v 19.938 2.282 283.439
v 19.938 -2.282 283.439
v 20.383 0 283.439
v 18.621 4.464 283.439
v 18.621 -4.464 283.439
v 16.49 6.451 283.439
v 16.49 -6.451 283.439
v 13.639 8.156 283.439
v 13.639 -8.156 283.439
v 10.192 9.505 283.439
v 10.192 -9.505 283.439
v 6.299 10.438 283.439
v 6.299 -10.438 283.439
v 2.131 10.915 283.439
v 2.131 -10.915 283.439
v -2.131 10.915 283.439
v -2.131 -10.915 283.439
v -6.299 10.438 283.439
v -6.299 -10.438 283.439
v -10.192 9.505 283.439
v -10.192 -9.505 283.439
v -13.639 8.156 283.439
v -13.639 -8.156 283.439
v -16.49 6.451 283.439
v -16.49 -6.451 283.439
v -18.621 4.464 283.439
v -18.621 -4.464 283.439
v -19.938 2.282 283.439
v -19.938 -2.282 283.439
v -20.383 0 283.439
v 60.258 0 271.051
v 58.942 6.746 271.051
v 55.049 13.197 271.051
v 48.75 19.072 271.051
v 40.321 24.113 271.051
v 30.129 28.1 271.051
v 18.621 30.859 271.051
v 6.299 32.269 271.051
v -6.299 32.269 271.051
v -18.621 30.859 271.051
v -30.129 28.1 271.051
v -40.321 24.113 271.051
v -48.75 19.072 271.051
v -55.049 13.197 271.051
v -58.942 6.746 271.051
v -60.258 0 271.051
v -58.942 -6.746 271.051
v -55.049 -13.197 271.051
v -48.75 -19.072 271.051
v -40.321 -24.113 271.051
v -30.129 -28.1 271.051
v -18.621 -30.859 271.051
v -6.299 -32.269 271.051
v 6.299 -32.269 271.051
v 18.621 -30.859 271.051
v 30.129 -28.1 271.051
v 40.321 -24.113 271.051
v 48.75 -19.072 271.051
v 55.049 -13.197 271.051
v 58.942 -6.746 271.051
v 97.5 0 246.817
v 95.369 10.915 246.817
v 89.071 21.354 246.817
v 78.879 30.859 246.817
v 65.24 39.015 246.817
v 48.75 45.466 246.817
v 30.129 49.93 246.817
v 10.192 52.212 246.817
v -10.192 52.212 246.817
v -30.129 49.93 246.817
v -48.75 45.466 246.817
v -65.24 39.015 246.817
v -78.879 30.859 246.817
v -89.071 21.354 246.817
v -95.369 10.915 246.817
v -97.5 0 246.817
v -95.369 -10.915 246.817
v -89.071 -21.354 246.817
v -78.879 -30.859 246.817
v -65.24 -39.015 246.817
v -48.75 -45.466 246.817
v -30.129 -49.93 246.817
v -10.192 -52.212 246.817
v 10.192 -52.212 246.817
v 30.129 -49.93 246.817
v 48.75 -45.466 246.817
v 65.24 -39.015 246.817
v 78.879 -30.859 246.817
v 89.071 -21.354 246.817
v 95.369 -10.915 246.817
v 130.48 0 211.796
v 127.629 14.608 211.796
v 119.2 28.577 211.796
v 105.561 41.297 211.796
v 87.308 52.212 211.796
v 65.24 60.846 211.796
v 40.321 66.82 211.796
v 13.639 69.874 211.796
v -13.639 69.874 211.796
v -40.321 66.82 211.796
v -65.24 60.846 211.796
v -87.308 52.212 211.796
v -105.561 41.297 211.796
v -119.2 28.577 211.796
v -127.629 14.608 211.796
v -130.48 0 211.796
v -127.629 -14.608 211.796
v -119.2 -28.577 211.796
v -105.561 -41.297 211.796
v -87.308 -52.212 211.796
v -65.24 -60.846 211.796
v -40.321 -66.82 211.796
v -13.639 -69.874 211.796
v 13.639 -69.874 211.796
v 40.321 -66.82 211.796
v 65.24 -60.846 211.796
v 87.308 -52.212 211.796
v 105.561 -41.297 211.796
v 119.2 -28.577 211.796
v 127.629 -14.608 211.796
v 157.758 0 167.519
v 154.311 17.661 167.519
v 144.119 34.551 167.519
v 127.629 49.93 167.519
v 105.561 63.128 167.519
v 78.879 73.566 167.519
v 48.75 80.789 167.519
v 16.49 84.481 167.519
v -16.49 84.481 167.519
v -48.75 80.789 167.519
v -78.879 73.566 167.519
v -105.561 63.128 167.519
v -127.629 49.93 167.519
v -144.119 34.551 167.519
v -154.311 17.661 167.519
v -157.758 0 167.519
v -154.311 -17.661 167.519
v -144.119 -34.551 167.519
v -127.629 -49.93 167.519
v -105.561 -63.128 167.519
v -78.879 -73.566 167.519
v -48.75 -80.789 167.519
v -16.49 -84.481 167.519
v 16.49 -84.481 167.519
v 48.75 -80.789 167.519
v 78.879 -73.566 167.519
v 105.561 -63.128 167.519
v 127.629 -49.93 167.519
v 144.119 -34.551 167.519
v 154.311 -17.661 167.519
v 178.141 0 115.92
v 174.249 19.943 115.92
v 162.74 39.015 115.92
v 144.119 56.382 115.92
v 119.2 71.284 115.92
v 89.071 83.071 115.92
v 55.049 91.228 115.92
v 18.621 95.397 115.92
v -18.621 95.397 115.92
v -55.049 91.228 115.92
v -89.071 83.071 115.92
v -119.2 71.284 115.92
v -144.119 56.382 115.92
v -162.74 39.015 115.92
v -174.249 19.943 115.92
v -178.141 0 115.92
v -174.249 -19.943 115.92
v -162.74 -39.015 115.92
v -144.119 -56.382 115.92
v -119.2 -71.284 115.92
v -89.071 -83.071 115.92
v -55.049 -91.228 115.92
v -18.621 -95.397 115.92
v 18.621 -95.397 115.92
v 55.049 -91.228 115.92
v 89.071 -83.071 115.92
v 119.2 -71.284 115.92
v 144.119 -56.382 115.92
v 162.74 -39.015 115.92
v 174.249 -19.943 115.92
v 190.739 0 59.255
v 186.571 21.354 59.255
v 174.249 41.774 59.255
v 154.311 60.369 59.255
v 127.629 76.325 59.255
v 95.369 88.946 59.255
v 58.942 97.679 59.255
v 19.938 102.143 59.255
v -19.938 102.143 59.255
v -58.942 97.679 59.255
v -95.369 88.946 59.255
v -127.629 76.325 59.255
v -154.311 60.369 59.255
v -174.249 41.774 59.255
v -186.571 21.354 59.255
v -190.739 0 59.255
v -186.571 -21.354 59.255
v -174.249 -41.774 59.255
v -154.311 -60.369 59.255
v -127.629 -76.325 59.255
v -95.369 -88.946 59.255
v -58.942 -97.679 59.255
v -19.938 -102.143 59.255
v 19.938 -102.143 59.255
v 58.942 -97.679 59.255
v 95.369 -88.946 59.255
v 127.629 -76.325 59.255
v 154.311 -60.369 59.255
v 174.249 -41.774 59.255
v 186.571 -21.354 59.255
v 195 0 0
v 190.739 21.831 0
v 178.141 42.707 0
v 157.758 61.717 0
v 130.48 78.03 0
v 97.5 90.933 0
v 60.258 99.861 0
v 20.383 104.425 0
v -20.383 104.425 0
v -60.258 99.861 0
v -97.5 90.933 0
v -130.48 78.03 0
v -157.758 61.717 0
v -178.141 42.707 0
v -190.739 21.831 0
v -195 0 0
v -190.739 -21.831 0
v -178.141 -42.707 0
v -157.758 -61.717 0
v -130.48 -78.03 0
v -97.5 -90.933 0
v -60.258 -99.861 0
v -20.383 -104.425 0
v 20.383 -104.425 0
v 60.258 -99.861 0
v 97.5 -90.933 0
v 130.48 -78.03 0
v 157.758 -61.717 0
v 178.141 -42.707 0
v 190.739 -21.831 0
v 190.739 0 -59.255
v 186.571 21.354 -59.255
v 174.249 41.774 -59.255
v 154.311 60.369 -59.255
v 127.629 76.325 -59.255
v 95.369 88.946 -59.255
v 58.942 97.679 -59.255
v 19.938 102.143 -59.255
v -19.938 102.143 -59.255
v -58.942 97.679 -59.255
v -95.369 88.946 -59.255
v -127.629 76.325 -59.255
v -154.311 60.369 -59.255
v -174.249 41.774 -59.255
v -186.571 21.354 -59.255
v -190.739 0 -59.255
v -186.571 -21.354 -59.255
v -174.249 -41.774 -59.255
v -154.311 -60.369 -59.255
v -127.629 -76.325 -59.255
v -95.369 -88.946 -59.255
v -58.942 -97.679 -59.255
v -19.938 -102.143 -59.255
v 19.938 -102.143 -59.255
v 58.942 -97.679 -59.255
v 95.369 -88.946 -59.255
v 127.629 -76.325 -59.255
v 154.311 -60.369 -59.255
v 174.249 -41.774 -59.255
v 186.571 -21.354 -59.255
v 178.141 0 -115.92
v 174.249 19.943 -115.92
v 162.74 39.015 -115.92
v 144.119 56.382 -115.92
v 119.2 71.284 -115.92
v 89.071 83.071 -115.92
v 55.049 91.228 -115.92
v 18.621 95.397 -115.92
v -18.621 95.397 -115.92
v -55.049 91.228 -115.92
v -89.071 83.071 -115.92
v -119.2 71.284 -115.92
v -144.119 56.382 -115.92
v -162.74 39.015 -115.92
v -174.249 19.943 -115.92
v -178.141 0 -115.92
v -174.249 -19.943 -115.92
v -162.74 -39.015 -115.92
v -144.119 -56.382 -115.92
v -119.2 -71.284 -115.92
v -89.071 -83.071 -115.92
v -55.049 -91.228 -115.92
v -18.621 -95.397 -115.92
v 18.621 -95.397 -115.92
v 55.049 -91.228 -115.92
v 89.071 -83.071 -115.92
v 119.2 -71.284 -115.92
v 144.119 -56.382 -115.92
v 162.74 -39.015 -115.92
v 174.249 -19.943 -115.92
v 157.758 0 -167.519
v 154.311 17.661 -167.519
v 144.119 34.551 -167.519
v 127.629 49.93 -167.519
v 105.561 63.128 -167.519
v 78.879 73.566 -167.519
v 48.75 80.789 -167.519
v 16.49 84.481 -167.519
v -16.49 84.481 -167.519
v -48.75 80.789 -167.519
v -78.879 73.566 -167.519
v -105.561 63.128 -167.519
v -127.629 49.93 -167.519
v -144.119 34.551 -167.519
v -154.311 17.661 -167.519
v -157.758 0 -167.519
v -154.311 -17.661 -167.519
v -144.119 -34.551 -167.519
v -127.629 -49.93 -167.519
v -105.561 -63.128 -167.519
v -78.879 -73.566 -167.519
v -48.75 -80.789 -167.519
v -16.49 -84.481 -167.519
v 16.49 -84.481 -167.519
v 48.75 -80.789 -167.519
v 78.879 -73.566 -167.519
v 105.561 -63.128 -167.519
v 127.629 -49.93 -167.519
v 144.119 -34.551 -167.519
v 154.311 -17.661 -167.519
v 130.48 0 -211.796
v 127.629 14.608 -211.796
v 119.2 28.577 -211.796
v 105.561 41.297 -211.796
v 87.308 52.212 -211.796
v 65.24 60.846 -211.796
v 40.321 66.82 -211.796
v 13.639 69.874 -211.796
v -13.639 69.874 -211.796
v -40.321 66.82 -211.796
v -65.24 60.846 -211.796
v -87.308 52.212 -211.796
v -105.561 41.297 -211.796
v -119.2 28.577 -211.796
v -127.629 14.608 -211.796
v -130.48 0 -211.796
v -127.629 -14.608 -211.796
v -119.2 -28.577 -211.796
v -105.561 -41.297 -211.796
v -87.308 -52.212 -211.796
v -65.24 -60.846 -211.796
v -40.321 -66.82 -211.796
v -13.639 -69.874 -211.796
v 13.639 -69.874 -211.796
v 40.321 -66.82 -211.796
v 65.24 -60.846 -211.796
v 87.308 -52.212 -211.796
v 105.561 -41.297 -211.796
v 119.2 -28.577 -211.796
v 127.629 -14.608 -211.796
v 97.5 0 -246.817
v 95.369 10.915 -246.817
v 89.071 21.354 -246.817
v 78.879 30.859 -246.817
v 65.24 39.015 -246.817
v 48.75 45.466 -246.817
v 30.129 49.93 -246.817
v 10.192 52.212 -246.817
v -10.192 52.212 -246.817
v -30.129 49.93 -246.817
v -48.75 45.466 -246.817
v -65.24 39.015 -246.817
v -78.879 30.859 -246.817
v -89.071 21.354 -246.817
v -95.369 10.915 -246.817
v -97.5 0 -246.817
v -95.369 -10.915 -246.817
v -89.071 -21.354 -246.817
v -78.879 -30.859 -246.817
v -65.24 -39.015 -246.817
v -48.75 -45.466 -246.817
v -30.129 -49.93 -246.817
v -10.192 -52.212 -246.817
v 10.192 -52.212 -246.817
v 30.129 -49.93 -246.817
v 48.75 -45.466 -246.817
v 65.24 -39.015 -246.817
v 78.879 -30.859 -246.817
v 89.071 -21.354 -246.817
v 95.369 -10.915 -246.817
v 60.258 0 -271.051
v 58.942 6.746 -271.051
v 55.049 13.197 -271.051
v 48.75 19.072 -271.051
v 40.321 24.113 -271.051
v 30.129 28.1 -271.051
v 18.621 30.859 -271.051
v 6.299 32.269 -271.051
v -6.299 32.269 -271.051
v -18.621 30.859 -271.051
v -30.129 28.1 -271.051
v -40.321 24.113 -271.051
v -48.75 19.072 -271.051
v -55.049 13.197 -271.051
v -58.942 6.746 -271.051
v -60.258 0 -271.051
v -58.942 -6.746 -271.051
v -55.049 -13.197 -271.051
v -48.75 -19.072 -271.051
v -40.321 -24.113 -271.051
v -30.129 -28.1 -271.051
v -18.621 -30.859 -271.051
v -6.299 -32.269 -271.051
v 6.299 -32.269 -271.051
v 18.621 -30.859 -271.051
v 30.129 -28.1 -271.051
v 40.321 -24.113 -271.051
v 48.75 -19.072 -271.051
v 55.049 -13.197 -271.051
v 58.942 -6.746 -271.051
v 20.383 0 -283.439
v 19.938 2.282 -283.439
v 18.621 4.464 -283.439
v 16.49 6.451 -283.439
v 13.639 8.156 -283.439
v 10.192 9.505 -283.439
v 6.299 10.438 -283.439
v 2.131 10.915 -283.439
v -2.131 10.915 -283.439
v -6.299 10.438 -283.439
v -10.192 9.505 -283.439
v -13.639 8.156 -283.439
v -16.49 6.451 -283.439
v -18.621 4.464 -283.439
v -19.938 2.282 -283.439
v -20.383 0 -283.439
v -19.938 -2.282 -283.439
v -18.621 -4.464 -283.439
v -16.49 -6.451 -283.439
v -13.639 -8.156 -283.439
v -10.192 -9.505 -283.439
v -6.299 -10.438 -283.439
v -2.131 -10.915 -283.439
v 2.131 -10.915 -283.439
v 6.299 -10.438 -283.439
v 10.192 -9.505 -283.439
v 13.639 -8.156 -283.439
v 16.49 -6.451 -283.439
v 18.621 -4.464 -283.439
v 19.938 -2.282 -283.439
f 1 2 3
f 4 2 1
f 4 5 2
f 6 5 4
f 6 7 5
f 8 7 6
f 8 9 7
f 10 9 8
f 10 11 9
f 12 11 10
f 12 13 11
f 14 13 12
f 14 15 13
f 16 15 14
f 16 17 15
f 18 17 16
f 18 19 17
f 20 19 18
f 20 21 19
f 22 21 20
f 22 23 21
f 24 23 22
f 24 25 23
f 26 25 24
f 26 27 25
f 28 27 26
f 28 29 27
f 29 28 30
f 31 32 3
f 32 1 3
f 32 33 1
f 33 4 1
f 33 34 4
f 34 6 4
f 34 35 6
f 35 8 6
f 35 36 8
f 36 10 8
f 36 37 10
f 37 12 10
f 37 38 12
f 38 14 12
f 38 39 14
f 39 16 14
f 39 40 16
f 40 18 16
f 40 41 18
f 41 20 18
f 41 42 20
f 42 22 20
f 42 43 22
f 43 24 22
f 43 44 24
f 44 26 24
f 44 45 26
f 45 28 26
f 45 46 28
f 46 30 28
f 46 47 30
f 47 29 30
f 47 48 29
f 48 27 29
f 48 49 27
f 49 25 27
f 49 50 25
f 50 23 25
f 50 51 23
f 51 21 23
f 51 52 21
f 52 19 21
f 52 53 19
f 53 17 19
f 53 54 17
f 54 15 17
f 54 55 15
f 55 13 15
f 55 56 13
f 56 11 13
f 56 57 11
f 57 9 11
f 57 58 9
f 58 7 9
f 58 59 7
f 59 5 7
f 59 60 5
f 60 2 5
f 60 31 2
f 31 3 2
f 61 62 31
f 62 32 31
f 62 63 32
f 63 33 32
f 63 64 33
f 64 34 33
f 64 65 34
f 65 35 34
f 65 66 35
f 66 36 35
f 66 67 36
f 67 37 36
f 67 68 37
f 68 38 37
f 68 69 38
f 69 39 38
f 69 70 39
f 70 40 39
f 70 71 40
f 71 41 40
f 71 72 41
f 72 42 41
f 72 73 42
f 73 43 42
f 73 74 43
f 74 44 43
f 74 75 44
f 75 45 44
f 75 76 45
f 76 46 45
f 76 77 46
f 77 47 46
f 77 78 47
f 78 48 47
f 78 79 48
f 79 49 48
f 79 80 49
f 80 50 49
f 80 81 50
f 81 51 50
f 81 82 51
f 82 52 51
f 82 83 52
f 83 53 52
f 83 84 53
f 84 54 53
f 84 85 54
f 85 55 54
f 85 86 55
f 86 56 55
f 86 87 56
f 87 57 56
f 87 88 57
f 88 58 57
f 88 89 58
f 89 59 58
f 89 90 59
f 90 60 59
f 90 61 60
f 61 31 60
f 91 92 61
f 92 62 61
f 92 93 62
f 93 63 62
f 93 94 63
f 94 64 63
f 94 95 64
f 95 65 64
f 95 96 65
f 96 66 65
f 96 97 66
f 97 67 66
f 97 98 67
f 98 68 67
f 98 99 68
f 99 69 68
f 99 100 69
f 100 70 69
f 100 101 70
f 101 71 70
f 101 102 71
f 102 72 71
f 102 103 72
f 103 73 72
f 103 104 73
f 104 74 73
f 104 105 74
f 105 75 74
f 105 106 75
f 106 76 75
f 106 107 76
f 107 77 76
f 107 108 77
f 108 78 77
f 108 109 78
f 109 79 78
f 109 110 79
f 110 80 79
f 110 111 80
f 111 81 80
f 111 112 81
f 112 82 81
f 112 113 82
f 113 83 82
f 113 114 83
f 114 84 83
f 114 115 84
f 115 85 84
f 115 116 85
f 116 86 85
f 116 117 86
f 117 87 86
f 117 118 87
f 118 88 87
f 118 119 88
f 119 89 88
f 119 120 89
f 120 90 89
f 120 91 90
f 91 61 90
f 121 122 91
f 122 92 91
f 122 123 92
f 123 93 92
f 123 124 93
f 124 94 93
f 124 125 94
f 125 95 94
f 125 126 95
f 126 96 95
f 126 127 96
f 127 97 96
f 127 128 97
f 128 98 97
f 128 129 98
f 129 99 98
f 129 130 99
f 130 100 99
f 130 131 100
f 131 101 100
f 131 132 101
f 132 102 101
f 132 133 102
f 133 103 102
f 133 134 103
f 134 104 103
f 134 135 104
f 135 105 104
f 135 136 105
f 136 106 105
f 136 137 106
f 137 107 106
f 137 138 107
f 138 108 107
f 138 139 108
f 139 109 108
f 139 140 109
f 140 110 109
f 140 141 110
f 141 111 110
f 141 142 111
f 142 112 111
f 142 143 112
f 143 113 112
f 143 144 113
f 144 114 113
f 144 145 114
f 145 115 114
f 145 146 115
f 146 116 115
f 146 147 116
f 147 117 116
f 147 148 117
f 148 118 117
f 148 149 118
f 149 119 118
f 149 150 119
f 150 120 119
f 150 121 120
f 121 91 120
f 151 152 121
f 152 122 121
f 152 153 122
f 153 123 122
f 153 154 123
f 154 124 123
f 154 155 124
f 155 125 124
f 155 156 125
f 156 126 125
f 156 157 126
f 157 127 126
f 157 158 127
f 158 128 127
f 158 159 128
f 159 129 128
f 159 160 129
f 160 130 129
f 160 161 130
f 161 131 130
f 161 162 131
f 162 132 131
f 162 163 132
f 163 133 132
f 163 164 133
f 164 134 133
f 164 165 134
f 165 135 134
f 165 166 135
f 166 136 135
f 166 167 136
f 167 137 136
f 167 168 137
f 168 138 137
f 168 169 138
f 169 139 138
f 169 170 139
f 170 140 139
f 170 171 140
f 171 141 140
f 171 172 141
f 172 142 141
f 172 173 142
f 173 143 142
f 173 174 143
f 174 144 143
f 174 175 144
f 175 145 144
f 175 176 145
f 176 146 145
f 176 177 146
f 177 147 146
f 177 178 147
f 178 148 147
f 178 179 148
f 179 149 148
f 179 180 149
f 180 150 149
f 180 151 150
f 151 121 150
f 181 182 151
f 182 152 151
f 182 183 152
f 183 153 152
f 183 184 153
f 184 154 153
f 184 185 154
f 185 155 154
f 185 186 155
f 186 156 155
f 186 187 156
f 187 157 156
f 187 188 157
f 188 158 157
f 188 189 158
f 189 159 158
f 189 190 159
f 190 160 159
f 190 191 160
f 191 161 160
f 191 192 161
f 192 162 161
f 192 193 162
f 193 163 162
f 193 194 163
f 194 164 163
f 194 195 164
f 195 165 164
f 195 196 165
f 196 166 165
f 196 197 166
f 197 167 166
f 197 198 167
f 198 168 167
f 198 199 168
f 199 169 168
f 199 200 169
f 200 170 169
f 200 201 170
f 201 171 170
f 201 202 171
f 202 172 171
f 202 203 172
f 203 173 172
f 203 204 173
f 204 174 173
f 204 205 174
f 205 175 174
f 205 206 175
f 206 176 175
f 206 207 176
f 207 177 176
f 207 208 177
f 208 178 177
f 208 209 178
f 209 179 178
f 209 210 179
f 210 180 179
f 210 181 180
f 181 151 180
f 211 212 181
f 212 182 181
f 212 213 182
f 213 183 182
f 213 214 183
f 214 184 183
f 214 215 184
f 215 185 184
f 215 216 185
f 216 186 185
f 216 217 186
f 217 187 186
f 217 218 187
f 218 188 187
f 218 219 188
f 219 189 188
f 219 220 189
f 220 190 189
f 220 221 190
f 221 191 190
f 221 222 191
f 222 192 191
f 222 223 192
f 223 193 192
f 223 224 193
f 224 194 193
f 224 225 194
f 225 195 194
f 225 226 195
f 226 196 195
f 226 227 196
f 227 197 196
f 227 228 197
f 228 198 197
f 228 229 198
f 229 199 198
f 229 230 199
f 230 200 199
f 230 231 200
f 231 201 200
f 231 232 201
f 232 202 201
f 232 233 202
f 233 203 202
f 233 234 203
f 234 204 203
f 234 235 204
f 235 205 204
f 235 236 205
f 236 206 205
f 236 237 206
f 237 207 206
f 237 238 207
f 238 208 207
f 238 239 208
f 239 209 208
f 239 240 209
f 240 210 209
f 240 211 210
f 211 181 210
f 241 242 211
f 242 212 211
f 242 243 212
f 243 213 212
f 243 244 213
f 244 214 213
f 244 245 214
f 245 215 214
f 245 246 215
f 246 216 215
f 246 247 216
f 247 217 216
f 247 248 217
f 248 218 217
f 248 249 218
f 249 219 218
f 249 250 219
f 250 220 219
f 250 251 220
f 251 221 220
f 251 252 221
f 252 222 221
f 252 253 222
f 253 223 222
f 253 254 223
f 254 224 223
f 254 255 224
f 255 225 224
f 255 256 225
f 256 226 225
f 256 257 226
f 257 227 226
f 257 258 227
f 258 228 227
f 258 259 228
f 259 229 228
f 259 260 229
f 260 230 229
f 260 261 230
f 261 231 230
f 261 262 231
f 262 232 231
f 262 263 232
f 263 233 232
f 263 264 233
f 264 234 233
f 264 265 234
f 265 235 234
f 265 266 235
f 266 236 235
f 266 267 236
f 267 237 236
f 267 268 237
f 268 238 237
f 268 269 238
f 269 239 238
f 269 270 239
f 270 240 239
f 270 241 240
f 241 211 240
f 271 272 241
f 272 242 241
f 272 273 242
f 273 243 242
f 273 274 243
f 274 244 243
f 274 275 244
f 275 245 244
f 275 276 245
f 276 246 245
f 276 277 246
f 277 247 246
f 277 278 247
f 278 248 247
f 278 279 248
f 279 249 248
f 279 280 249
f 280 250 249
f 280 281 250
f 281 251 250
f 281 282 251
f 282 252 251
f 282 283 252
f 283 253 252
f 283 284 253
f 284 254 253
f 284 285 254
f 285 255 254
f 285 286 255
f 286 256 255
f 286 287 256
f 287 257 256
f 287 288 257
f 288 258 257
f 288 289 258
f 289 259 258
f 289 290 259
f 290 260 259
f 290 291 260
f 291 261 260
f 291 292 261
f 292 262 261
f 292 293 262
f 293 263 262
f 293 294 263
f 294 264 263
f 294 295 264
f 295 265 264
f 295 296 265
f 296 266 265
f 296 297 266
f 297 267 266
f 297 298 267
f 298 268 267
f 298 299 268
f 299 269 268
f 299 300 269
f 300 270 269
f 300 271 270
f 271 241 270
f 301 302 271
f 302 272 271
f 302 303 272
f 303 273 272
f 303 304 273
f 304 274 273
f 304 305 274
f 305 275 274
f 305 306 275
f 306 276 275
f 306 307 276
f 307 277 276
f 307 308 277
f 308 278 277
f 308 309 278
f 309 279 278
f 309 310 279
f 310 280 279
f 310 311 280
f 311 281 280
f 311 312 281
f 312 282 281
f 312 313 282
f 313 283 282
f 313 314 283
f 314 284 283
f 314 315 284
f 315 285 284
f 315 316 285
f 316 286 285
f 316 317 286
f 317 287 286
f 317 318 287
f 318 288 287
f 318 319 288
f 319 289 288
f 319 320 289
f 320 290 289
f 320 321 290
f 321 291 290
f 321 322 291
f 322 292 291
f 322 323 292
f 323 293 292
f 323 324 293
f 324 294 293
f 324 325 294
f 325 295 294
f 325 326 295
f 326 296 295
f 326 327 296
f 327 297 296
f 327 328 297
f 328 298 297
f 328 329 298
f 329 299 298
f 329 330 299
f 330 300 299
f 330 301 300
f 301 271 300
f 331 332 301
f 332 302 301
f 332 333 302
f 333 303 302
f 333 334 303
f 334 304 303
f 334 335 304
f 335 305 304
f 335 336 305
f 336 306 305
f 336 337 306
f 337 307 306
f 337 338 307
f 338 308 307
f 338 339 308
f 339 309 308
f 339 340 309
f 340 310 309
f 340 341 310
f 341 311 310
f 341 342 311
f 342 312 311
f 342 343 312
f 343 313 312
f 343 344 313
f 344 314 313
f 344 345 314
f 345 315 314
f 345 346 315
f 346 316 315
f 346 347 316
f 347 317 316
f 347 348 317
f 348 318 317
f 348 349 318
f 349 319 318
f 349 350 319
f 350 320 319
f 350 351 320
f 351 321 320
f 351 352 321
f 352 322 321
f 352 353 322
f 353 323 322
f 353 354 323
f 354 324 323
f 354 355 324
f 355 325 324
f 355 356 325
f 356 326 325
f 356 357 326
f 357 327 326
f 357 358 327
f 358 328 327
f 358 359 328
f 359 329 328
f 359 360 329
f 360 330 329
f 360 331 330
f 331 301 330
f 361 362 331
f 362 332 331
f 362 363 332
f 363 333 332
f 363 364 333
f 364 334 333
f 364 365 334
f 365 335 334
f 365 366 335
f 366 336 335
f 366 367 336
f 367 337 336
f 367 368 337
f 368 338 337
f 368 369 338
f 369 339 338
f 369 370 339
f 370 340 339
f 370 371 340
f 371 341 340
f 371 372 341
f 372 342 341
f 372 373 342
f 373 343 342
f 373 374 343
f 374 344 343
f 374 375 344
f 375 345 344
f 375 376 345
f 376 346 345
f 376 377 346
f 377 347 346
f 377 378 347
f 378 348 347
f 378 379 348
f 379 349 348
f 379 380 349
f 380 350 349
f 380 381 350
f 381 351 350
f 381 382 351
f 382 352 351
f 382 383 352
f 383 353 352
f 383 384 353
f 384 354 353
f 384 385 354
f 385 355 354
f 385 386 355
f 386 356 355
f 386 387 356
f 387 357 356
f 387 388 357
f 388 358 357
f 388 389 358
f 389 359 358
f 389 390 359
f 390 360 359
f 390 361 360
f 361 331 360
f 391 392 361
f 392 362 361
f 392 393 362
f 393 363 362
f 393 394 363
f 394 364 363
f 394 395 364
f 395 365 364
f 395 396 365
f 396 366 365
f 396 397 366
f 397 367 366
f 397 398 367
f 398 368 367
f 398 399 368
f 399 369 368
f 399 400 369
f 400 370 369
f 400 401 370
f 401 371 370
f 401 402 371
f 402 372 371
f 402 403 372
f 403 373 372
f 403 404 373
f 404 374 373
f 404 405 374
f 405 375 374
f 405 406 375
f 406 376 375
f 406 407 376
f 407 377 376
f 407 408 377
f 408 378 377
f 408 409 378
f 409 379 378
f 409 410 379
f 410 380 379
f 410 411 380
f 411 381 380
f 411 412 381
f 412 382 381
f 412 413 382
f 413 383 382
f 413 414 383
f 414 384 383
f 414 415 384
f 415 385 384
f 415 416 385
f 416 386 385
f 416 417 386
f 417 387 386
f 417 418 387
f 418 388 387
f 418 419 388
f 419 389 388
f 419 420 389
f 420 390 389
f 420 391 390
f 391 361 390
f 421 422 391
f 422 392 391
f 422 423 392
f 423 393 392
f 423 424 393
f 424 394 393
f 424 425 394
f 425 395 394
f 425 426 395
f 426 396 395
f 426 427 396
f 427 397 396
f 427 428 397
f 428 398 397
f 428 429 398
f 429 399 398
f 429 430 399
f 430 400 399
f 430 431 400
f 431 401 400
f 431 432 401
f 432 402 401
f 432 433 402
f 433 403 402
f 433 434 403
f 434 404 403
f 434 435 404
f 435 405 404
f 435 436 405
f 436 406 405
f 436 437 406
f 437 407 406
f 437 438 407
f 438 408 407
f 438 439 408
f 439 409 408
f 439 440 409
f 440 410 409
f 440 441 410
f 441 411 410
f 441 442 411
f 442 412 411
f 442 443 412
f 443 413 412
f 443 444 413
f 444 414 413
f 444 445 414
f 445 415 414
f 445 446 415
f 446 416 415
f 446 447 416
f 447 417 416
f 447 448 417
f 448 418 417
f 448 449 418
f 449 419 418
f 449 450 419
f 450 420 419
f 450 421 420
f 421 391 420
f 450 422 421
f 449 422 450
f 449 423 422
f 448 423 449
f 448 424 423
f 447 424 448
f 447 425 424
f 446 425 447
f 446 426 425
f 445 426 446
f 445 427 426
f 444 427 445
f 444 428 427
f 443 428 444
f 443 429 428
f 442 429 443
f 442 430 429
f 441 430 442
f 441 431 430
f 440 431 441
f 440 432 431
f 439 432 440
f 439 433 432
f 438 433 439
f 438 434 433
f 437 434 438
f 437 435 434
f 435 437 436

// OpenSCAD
// Generated by SolidPython 1.0.1 on 2020-07-29 00:46:50


scale(v = [13, 7, 19]) {
	sphere(r = 15);
}
/***********************************************
*********      SolidPython code:      **********
************************************************
 
# import packages: SolidPython
from solid import *
from solid.utils import *
from itertools import chain, combinations, permutations


class Resize:

    def __init__(self, scad_file):
        self.scad_file = scad_file
        #self.scad_file = import_scad(scad_file)
        # cone/cylinder param:
        self.r1 = 0
        self.r2 = 0
        self.h = 0
        # rectangular prism param:
        self.w = 0
        self.l = 0
        # ellipse param:
        self.r = 0

    # import OpenScad code (file name corresponds to shape)


    # classify shape + parameters
    def assign(self, param1, param2, param3):
        if self.scad_file == 'cone.scad':
            self.r1 = param1
            self.r2 = param2
            self.h = param3
        elif self.scad_file == 'cylinder.scad':
            self.r1 = param1
            self.r2 = param2
            self.h = param3
        elif self.scad_file == 'rectangularPrism.scad':
            self.h = param1
            self.l = param2
            self.w = param3
        else:
            self.r = param1
            self.h = param2

    # resize parameters
    def iterate(self):
        x = range(3, 20, 2)
        i = 1
        if self.scad_file == 'cone.scad':
            tempList = list(permutations(x, 2))
            for temp in tempList:
                param1 = temp[0]
                param2 = temp[1]
                filepath = 'produced_scad_files/' + 'cone' + str(param1) + '_' + str(param2) + '_' + '.scad'
                scad_render_to_file(cylinder(h=param1, r1=param2, r2=0), filepath)

        elif self.scad_file == 'cylinder.scad':
            tempList = list(permutations(x, 3))
            for temp in tempList:
                param1 = temp[0]
                param2 = temp[1]
                filepath = 'produced_scad_files/' + 'cylinder' + str(param1) + '_' + str(param2) + '_' + '.scad'
                scad_render_to_file(cylinder(h=param1, r1=param2, r2=param2), filepath)

        elif self.scad_file == 'rectangularPrism.scad':
            tempList = list(permutations(x, 3))
            for temp in tempList:
                param1 = temp[0]
                param2 = temp[1]
                param3 = temp[2]
                filepath = 'produced_scad_files/' + 'rectangularPrism' + str(param1) + '_' + str(param2) + '_' + str(
                    param3) + '.scad'
                scad_render_to_file(cube(size=(param1, param2, param3)), filepath)

        elif self.scad_file == 'ellipse.scad':
            tempList = list(permutations(x, 4))
            for temp in tempList:
                param1 = temp[0]
                param2 = temp[1]
                param3 = temp[2]
                param4 = temp[3]
                filepath = 'produced_scad_files/' + 'ellipse' + str(param1) + '_' + str(param2) + '_' + str(param3) + '_' + str(param4) + '.scad'
                scad_render_to_file(scale([param1, param2, param3])(sphere(r=param4)), filepath)

    def render_to_scadfile(self):
        scad_render_to_file(scad, 'example.scad') 
 
************************************************/
